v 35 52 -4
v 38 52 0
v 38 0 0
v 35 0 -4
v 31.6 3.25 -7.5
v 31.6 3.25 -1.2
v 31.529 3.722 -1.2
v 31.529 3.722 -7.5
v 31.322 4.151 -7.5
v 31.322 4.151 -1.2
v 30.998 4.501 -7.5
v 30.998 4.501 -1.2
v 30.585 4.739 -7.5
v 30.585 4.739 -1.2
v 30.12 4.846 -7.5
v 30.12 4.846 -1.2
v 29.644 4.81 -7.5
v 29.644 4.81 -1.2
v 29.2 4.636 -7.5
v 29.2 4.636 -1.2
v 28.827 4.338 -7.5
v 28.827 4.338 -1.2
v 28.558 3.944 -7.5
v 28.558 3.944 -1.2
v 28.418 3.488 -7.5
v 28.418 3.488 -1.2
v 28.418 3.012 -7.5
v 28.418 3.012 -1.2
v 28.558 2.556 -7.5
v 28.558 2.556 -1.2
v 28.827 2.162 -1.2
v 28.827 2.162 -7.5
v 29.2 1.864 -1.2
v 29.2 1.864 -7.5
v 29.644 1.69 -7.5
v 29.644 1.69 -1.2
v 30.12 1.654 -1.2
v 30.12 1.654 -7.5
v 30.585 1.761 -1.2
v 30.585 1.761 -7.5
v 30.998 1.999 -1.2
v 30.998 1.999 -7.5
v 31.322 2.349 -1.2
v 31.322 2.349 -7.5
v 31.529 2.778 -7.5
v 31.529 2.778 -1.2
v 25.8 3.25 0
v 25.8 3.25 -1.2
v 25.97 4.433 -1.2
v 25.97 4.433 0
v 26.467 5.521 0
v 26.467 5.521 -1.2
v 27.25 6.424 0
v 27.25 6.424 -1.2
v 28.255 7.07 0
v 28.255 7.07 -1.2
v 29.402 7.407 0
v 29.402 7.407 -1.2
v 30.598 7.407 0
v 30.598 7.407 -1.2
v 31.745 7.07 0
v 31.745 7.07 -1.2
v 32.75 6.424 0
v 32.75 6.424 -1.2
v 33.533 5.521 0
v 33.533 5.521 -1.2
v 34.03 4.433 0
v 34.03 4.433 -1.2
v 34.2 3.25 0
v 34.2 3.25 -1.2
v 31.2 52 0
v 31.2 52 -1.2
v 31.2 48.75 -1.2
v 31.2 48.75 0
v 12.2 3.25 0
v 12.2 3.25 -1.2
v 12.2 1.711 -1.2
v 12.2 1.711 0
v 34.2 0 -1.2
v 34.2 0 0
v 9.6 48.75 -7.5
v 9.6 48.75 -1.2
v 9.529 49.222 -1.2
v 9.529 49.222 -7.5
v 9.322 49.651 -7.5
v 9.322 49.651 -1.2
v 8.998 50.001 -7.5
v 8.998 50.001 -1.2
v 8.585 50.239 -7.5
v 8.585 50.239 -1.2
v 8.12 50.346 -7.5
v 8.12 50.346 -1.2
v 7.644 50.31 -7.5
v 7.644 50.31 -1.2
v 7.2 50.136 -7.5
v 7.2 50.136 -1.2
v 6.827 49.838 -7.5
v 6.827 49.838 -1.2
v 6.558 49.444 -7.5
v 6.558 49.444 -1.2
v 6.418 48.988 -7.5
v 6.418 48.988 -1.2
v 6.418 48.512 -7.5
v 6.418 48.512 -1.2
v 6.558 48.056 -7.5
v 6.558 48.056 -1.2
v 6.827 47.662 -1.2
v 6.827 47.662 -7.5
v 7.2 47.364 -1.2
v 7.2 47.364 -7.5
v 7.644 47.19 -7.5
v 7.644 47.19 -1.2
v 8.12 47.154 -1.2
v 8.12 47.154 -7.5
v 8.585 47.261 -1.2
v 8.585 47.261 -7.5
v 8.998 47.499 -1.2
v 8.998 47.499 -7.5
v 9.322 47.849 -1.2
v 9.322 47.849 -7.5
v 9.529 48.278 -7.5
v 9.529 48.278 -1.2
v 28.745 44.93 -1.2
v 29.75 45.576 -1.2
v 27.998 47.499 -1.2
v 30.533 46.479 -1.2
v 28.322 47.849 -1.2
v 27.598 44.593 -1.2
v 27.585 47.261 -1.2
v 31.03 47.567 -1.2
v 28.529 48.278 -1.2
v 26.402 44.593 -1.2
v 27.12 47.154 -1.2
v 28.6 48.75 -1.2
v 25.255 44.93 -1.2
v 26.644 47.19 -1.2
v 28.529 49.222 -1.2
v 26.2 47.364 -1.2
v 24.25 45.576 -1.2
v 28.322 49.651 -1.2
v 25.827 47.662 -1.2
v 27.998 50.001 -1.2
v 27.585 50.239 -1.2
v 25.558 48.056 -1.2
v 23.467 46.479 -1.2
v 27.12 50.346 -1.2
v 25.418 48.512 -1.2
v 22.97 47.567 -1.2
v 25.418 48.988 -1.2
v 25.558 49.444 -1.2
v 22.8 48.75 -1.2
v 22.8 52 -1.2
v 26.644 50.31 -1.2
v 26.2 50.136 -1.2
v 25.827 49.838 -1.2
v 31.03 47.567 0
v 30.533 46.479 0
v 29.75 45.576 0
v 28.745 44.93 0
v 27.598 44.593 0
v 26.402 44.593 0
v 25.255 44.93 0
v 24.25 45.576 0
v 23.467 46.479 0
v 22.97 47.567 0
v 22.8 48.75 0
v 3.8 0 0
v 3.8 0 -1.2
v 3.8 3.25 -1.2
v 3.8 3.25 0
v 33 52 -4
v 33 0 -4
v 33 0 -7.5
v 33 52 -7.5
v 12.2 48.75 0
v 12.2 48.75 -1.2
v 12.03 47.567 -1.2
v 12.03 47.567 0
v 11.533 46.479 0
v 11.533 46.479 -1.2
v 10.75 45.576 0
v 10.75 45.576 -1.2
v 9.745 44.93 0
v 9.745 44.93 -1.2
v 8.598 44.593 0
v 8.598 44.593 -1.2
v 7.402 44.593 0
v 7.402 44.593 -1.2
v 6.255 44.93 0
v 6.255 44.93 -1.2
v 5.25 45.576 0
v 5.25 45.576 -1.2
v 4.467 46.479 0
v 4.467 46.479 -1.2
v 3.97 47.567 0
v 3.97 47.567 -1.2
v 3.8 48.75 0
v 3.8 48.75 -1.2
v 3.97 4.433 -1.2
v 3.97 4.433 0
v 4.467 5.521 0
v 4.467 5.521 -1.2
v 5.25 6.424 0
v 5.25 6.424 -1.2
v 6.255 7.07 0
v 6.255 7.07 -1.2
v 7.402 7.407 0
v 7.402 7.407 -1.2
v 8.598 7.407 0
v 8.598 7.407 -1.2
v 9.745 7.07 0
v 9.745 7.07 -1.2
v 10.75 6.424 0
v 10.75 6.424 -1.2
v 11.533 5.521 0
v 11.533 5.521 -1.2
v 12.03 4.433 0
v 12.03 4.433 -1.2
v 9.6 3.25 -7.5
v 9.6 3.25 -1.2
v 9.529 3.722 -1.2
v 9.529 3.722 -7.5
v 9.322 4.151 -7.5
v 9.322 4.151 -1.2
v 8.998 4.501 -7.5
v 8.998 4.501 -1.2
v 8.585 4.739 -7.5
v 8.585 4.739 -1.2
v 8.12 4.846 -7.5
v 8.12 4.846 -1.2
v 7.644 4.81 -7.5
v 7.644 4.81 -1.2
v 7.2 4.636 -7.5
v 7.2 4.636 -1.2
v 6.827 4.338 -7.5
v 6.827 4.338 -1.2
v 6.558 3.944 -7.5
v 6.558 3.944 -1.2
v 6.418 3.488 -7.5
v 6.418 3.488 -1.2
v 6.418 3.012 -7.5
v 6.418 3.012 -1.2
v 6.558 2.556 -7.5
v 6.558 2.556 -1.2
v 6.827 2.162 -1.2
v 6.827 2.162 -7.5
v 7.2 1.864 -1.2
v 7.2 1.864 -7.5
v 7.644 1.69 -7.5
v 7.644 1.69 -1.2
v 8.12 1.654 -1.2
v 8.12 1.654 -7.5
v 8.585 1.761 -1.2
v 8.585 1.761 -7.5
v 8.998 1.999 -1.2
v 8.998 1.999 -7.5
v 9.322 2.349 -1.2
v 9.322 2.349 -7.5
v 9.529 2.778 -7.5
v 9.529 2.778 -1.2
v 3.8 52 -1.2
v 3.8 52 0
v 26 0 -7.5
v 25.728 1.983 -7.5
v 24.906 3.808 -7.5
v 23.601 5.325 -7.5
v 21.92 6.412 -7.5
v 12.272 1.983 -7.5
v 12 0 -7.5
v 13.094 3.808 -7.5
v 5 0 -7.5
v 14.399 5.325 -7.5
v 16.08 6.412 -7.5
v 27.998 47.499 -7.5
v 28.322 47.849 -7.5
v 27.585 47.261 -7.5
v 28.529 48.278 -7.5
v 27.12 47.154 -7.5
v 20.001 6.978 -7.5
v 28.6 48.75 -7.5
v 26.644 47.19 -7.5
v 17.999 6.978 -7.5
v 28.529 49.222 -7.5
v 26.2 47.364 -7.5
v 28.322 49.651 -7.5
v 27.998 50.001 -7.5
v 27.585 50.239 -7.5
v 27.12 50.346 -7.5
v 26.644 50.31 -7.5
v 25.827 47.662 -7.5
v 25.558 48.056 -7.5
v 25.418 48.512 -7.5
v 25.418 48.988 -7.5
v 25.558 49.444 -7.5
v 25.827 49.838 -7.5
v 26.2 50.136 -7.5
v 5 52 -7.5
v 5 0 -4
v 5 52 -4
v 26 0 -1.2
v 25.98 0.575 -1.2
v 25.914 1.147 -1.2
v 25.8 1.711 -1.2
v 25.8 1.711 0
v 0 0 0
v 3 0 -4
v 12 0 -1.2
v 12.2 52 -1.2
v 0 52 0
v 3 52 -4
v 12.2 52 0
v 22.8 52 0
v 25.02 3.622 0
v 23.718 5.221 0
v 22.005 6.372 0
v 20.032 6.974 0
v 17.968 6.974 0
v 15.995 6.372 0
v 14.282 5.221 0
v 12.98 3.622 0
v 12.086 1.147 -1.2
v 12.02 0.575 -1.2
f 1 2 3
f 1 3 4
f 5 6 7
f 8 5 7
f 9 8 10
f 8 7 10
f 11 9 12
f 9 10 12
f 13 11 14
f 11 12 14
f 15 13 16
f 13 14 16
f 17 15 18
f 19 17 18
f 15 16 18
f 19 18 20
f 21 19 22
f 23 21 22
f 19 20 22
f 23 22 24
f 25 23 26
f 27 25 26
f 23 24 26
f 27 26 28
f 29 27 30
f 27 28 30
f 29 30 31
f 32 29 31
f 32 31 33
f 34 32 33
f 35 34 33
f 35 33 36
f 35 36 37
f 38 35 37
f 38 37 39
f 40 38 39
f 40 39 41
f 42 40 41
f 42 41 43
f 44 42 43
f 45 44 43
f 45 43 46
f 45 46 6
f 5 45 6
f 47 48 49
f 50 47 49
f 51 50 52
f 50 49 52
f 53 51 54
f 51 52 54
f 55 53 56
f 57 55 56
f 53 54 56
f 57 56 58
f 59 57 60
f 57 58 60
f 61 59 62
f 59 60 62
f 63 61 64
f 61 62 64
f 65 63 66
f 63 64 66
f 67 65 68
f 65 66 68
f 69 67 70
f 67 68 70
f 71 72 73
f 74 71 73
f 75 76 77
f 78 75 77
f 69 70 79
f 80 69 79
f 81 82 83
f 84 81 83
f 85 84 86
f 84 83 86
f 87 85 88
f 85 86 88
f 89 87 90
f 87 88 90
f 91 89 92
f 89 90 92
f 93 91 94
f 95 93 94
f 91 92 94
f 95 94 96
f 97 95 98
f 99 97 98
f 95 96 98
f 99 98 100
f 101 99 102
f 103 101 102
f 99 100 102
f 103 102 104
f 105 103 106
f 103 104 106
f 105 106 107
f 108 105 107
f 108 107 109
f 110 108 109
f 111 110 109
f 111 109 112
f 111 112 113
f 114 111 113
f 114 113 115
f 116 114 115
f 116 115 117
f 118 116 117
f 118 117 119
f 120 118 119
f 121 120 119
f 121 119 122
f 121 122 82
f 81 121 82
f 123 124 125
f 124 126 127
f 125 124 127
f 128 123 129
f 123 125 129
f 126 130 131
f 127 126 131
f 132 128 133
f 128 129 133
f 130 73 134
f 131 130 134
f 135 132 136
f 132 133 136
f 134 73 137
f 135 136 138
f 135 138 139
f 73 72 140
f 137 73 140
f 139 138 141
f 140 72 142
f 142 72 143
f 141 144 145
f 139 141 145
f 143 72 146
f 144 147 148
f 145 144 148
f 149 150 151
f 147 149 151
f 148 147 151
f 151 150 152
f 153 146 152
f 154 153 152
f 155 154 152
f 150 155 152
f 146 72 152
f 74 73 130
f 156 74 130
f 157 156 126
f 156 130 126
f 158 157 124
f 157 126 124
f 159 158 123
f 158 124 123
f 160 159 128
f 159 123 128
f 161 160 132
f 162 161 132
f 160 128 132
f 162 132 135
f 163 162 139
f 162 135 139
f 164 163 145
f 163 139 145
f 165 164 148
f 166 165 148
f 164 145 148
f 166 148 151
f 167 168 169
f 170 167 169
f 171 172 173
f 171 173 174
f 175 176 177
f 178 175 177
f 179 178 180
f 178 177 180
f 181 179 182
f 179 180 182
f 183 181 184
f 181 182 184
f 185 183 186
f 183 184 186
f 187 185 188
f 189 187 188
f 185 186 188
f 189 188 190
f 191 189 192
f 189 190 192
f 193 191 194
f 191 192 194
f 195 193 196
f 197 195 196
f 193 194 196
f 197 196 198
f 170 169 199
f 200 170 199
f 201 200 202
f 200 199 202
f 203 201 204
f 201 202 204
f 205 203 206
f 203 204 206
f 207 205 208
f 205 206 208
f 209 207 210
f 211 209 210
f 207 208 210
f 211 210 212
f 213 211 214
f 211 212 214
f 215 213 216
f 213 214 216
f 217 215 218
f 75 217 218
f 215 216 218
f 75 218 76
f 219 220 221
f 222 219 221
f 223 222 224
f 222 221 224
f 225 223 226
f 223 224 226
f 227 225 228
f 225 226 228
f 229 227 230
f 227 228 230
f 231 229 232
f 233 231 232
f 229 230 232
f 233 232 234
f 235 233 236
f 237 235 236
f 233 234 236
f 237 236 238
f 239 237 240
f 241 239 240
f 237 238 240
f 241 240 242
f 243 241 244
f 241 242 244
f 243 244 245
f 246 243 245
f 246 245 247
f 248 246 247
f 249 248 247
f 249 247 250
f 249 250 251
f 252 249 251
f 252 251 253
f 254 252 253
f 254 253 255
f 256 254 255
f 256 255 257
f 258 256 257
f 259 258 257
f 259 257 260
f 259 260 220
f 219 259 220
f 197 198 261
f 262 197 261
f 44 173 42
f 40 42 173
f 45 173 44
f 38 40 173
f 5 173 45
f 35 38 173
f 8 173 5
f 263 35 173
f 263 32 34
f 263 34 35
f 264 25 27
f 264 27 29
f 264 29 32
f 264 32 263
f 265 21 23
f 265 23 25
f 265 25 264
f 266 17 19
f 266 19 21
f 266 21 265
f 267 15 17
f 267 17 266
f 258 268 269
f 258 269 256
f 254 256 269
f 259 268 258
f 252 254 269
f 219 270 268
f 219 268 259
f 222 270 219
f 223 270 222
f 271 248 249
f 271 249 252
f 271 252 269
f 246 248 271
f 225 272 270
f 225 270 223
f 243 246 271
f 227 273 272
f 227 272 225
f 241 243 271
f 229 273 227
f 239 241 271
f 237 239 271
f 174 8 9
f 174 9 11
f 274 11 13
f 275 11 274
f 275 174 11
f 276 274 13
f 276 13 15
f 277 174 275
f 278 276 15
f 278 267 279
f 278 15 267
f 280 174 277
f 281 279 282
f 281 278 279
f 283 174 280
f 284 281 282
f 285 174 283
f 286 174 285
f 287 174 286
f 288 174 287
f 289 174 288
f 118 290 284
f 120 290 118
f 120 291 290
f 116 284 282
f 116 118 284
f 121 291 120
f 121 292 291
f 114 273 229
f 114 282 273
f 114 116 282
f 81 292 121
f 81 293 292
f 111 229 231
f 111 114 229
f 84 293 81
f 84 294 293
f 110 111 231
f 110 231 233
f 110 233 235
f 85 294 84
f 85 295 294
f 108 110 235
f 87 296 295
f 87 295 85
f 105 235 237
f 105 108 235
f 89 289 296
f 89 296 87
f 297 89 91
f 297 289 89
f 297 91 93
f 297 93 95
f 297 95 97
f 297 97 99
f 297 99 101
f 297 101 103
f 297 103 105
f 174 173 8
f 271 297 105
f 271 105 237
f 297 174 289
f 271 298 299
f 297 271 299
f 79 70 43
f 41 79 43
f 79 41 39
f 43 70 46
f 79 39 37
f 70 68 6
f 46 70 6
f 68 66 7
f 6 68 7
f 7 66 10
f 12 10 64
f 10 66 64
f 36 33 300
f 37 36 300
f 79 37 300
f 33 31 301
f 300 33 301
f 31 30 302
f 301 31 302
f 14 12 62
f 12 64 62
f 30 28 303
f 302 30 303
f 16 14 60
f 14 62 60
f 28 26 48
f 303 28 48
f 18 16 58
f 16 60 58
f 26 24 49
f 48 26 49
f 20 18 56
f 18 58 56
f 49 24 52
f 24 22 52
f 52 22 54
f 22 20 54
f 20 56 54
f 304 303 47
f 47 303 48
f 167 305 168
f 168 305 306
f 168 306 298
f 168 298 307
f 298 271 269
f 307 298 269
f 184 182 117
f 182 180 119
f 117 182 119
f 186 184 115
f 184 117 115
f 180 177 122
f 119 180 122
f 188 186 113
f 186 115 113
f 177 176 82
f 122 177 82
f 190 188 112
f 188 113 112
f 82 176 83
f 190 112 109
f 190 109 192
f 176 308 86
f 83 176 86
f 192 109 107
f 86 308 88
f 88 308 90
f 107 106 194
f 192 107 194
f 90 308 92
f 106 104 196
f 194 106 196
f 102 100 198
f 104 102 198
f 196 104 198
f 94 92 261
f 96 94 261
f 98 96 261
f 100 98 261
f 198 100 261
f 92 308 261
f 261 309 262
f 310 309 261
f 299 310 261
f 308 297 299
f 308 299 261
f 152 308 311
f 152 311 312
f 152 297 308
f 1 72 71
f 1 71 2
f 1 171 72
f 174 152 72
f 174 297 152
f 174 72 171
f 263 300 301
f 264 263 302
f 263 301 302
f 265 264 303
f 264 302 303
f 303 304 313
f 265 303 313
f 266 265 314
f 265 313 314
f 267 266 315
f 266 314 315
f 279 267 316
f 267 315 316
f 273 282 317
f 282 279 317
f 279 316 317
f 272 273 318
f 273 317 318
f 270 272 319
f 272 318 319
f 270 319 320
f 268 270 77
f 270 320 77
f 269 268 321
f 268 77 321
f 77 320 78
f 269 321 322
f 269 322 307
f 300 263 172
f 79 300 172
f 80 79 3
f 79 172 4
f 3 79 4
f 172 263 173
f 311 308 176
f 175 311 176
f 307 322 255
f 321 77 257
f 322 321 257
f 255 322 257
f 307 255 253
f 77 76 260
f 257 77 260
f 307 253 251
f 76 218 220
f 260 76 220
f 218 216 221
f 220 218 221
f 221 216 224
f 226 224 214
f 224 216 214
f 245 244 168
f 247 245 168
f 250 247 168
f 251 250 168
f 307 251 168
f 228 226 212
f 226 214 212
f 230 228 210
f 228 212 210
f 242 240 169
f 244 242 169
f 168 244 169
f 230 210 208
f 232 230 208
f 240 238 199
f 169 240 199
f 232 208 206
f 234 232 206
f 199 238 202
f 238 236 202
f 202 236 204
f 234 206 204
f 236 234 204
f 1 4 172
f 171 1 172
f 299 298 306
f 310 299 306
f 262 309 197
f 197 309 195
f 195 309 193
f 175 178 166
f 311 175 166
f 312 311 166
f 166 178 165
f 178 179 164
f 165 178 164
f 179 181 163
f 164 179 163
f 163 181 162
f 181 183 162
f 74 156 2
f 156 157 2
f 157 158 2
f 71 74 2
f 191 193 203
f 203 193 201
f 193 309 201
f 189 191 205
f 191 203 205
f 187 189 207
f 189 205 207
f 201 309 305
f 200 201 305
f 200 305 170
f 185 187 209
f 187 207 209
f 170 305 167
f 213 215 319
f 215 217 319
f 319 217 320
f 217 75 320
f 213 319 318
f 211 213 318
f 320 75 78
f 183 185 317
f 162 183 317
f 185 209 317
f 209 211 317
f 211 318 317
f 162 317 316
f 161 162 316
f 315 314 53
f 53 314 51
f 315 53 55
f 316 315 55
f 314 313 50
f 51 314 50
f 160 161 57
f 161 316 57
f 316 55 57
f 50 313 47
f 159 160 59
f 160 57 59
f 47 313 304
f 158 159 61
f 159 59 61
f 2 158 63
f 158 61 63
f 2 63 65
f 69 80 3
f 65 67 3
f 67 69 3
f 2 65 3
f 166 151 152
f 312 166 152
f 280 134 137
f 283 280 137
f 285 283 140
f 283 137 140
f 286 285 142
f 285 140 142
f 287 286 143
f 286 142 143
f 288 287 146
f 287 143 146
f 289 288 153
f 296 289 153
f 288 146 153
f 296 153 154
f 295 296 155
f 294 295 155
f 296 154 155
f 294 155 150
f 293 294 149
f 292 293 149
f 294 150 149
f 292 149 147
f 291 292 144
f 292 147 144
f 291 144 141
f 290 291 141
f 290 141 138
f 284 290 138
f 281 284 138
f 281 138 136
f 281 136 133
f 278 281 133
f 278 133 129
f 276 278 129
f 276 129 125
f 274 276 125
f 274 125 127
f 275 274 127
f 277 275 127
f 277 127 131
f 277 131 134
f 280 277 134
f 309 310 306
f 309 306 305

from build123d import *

# Parameters (mm, degrees)
EXTRUDE_1_DEPTH     = 52
SKETCH_3_W          = 28
SKETCH_3_H          = 52
EXTRUDE_2_DEPTH     = 3.5
CUT_EXTRUDE_1_REACH = 66.84
SKETCH_4_R          = 1.6
SKETCH_6_R          = 7
CUT_EXTRUDE_2_DEPTH = 65.840188155
SKETCH_7_R          = 4
CUT_EXTRUDE_3_DEPTH = 1.2
CUT_EXTRUDE_4_REACH = 66.712


with BuildPart() as part:
    # 草图2 → 凸台-拉伸1 (new body)
    with BuildSketch(Plane(origin=(0, 0, 0), x_dir=(1, 0, 0), z_dir=(0, 1, 0))):
        Polygon((0, 0), (38, 0), (35, 4), (3, 4), align=None)
    extrude(amount=EXTRUDE_1_DEPTH)

    # 草图3 → 凸台-拉伸2 (add)
    with BuildSketch(Plane(origin=(0, 0, -4), x_dir=(-1, 0, 0), z_dir=(0, 0, -1))):
        with Locations((-19, 26)):
            Rectangle(SKETCH_3_W, SKETCH_3_H)
    extrude(amount=EXTRUDE_2_DEPTH)

    # 草图4 → 切除-拉伸1 (cut, up to next)
    with BuildSketch(Plane.XY, mode=Mode.PRIVATE) as cut_extrude_1_sk1:
        with Locations((8, 3.25)):
            Circle(SKETCH_4_R)
    cut_extrude_1_tool1 = extrude(cut_extrude_1_sk1.sketch, amount=-CUT_EXTRUDE_1_REACH, mode=Mode.PRIVATE) & part.part
    # 草图4 → 切除-拉伸1 (cut, up to next)
    with BuildSketch(Plane.XY, mode=Mode.PRIVATE) as cut_extrude_1_sk2:
        with Locations((30, 3.25)):
            Circle(SKETCH_4_R)
    cut_extrude_1_tool2 = extrude(cut_extrude_1_sk2.sketch, amount=-CUT_EXTRUDE_1_REACH, mode=Mode.PRIVATE) & part.part
    # 草图4 → 切除-拉伸1 (cut, up to next)
    with BuildSketch(Plane.XY, mode=Mode.PRIVATE) as cut_extrude_1_sk3:
        with Locations((8, 48.75)):
            Circle(SKETCH_4_R)
    cut_extrude_1_tool3 = extrude(cut_extrude_1_sk3.sketch, amount=-CUT_EXTRUDE_1_REACH, mode=Mode.PRIVATE) & part.part
    # 草图4 → 切除-拉伸1 (cut, up to next)
    with BuildSketch(Plane.XY, mode=Mode.PRIVATE) as cut_extrude_1_sk4:
        with Locations((27, 48.75)):
            Circle(SKETCH_4_R)
    cut_extrude_1_tool4 = extrude(cut_extrude_1_sk4.sketch, amount=-CUT_EXTRUDE_1_REACH, mode=Mode.PRIVATE) & part.part
    add(cut_extrude_1_tool1.solids().sort_by_distance((8, 3.25, 0))[0], mode=Mode.SUBTRACT)
    add(cut_extrude_1_tool2.solids().sort_by_distance((30, 3.25, 0))[0], mode=Mode.SUBTRACT)
    add(cut_extrude_1_tool3.solids().sort_by_distance((8, 48.75, 0))[0], mode=Mode.SUBTRACT)
    add(cut_extrude_1_tool4.solids().sort_by_distance((27, 48.75, 0))[0], mode=Mode.SUBTRACT)

    # 草图6 → 切除-拉伸2 (cut, through all)
    with BuildSketch(Plane.XY):
        with Locations((19, 0.05)):
            Circle(SKETCH_6_R)
    extrude(amount=-CUT_EXTRUDE_2_DEPTH, mode=Mode.SUBTRACT)

    # 草图7 → 切除-拉伸3 (cut)
    with BuildSketch(Plane.XY):
        with Locations((8, 48.75)):
            Circle(SKETCH_7_R)
        with Locations((27, 48.75)):
            Circle(SKETCH_7_R)
        with Locations((8, 3.25)):
            Circle(SKETCH_7_R)
        with Locations((30, 3.25)):
            Circle(SKETCH_7_R)
    extrude(amount=-CUT_EXTRUDE_3_DEPTH, mode=Mode.SUBTRACT)

    # 草图8 → 切除-拉伸4 (cut, up to next)
    with BuildSketch(Plane.XY.offset(-1.2), mode=Mode.PRIVATE) as cut_extrude_4_sk1:
        with BuildLine():
            Line((3.8, 48.75), (3.8, 52))
            ThreePointArc((3.8, 52), (8, 56.2), (12.2, 52))
            Line((12.2, 52), (12.2, 48.75))
            ThreePointArc((12.2, 48.75), (8, 44.55), (3.8, 48.75))
        make_face()
    cut_extrude_4_tool1 = extrude(cut_extrude_4_sk1.sketch, amount=CUT_EXTRUDE_4_REACH, mode=Mode.PRIVATE) & part.part
    # 草图8 → 切除-拉伸4 (cut, up to next)
    with BuildSketch(Plane.XY.offset(-1.2), mode=Mode.PRIVATE) as cut_extrude_4_sk2:
        with BuildLine():
            Line((22.8, 48.75), (22.8, 52))
            ThreePointArc((22.8, 52), (27, 56.2), (31.2, 52))
            Line((31.2, 52), (31.2, 48.75))
            ThreePointArc((31.2, 48.75), (27, 44.55), (22.8, 48.75))
        make_face()
    cut_extrude_4_tool2 = extrude(cut_extrude_4_sk2.sketch, amount=CUT_EXTRUDE_4_REACH, mode=Mode.PRIVATE) & part.part
    # 草图8 → 切除-拉伸4 (cut, up to next)
    with BuildSketch(Plane.XY.offset(-1.2), mode=Mode.PRIVATE) as cut_extrude_4_sk3:
        with BuildLine():
            Line((12.2, 3.25), (12.2, 0))
            ThreePointArc((12.2, 0), (8, -4.2), (3.8, 0))
            Line((3.8, 0), (3.8, 3.25))
            ThreePointArc((3.8, 3.25), (8, 7.45), (12.2, 3.25))
        make_face()
    cut_extrude_4_tool3 = extrude(cut_extrude_4_sk3.sketch, amount=CUT_EXTRUDE_4_REACH, mode=Mode.PRIVATE) & part.part
    # 草图8 → 切除-拉伸4 (cut, up to next)
    with BuildSketch(Plane.XY.offset(-1.2), mode=Mode.PRIVATE) as cut_extrude_4_sk4:
        with BuildLine():
            Line((34.2, 3.25), (34.2, 0))
            ThreePointArc((34.2, 0), (30, -4.2), (25.8, 0))
            Line((25.8, 0), (25.8, 3.25))
            ThreePointArc((25.8, 3.25), (30, 7.45), (34.2, 3.25))
        make_face()
    cut_extrude_4_tool4 = extrude(cut_extrude_4_sk4.sketch, amount=CUT_EXTRUDE_4_REACH, mode=Mode.PRIVATE) & part.part
    add(cut_extrude_4_tool1.solids().sort_by_distance((8, 50.375, -1.2))[0], mode=Mode.SUBTRACT)
    add(cut_extrude_4_tool2.solids().sort_by_distance((27, 50.375, -1.2))[0], mode=Mode.SUBTRACT)
    add(cut_extrude_4_tool3.solids().sort_by_distance((8, 1.625, -1.2))[0], mode=Mode.SUBTRACT)
    add(cut_extrude_4_tool4.solids().sort_by_distance((30, 1.625, -1.2))[0], mode=Mode.SUBTRACT)


solid = part.part
